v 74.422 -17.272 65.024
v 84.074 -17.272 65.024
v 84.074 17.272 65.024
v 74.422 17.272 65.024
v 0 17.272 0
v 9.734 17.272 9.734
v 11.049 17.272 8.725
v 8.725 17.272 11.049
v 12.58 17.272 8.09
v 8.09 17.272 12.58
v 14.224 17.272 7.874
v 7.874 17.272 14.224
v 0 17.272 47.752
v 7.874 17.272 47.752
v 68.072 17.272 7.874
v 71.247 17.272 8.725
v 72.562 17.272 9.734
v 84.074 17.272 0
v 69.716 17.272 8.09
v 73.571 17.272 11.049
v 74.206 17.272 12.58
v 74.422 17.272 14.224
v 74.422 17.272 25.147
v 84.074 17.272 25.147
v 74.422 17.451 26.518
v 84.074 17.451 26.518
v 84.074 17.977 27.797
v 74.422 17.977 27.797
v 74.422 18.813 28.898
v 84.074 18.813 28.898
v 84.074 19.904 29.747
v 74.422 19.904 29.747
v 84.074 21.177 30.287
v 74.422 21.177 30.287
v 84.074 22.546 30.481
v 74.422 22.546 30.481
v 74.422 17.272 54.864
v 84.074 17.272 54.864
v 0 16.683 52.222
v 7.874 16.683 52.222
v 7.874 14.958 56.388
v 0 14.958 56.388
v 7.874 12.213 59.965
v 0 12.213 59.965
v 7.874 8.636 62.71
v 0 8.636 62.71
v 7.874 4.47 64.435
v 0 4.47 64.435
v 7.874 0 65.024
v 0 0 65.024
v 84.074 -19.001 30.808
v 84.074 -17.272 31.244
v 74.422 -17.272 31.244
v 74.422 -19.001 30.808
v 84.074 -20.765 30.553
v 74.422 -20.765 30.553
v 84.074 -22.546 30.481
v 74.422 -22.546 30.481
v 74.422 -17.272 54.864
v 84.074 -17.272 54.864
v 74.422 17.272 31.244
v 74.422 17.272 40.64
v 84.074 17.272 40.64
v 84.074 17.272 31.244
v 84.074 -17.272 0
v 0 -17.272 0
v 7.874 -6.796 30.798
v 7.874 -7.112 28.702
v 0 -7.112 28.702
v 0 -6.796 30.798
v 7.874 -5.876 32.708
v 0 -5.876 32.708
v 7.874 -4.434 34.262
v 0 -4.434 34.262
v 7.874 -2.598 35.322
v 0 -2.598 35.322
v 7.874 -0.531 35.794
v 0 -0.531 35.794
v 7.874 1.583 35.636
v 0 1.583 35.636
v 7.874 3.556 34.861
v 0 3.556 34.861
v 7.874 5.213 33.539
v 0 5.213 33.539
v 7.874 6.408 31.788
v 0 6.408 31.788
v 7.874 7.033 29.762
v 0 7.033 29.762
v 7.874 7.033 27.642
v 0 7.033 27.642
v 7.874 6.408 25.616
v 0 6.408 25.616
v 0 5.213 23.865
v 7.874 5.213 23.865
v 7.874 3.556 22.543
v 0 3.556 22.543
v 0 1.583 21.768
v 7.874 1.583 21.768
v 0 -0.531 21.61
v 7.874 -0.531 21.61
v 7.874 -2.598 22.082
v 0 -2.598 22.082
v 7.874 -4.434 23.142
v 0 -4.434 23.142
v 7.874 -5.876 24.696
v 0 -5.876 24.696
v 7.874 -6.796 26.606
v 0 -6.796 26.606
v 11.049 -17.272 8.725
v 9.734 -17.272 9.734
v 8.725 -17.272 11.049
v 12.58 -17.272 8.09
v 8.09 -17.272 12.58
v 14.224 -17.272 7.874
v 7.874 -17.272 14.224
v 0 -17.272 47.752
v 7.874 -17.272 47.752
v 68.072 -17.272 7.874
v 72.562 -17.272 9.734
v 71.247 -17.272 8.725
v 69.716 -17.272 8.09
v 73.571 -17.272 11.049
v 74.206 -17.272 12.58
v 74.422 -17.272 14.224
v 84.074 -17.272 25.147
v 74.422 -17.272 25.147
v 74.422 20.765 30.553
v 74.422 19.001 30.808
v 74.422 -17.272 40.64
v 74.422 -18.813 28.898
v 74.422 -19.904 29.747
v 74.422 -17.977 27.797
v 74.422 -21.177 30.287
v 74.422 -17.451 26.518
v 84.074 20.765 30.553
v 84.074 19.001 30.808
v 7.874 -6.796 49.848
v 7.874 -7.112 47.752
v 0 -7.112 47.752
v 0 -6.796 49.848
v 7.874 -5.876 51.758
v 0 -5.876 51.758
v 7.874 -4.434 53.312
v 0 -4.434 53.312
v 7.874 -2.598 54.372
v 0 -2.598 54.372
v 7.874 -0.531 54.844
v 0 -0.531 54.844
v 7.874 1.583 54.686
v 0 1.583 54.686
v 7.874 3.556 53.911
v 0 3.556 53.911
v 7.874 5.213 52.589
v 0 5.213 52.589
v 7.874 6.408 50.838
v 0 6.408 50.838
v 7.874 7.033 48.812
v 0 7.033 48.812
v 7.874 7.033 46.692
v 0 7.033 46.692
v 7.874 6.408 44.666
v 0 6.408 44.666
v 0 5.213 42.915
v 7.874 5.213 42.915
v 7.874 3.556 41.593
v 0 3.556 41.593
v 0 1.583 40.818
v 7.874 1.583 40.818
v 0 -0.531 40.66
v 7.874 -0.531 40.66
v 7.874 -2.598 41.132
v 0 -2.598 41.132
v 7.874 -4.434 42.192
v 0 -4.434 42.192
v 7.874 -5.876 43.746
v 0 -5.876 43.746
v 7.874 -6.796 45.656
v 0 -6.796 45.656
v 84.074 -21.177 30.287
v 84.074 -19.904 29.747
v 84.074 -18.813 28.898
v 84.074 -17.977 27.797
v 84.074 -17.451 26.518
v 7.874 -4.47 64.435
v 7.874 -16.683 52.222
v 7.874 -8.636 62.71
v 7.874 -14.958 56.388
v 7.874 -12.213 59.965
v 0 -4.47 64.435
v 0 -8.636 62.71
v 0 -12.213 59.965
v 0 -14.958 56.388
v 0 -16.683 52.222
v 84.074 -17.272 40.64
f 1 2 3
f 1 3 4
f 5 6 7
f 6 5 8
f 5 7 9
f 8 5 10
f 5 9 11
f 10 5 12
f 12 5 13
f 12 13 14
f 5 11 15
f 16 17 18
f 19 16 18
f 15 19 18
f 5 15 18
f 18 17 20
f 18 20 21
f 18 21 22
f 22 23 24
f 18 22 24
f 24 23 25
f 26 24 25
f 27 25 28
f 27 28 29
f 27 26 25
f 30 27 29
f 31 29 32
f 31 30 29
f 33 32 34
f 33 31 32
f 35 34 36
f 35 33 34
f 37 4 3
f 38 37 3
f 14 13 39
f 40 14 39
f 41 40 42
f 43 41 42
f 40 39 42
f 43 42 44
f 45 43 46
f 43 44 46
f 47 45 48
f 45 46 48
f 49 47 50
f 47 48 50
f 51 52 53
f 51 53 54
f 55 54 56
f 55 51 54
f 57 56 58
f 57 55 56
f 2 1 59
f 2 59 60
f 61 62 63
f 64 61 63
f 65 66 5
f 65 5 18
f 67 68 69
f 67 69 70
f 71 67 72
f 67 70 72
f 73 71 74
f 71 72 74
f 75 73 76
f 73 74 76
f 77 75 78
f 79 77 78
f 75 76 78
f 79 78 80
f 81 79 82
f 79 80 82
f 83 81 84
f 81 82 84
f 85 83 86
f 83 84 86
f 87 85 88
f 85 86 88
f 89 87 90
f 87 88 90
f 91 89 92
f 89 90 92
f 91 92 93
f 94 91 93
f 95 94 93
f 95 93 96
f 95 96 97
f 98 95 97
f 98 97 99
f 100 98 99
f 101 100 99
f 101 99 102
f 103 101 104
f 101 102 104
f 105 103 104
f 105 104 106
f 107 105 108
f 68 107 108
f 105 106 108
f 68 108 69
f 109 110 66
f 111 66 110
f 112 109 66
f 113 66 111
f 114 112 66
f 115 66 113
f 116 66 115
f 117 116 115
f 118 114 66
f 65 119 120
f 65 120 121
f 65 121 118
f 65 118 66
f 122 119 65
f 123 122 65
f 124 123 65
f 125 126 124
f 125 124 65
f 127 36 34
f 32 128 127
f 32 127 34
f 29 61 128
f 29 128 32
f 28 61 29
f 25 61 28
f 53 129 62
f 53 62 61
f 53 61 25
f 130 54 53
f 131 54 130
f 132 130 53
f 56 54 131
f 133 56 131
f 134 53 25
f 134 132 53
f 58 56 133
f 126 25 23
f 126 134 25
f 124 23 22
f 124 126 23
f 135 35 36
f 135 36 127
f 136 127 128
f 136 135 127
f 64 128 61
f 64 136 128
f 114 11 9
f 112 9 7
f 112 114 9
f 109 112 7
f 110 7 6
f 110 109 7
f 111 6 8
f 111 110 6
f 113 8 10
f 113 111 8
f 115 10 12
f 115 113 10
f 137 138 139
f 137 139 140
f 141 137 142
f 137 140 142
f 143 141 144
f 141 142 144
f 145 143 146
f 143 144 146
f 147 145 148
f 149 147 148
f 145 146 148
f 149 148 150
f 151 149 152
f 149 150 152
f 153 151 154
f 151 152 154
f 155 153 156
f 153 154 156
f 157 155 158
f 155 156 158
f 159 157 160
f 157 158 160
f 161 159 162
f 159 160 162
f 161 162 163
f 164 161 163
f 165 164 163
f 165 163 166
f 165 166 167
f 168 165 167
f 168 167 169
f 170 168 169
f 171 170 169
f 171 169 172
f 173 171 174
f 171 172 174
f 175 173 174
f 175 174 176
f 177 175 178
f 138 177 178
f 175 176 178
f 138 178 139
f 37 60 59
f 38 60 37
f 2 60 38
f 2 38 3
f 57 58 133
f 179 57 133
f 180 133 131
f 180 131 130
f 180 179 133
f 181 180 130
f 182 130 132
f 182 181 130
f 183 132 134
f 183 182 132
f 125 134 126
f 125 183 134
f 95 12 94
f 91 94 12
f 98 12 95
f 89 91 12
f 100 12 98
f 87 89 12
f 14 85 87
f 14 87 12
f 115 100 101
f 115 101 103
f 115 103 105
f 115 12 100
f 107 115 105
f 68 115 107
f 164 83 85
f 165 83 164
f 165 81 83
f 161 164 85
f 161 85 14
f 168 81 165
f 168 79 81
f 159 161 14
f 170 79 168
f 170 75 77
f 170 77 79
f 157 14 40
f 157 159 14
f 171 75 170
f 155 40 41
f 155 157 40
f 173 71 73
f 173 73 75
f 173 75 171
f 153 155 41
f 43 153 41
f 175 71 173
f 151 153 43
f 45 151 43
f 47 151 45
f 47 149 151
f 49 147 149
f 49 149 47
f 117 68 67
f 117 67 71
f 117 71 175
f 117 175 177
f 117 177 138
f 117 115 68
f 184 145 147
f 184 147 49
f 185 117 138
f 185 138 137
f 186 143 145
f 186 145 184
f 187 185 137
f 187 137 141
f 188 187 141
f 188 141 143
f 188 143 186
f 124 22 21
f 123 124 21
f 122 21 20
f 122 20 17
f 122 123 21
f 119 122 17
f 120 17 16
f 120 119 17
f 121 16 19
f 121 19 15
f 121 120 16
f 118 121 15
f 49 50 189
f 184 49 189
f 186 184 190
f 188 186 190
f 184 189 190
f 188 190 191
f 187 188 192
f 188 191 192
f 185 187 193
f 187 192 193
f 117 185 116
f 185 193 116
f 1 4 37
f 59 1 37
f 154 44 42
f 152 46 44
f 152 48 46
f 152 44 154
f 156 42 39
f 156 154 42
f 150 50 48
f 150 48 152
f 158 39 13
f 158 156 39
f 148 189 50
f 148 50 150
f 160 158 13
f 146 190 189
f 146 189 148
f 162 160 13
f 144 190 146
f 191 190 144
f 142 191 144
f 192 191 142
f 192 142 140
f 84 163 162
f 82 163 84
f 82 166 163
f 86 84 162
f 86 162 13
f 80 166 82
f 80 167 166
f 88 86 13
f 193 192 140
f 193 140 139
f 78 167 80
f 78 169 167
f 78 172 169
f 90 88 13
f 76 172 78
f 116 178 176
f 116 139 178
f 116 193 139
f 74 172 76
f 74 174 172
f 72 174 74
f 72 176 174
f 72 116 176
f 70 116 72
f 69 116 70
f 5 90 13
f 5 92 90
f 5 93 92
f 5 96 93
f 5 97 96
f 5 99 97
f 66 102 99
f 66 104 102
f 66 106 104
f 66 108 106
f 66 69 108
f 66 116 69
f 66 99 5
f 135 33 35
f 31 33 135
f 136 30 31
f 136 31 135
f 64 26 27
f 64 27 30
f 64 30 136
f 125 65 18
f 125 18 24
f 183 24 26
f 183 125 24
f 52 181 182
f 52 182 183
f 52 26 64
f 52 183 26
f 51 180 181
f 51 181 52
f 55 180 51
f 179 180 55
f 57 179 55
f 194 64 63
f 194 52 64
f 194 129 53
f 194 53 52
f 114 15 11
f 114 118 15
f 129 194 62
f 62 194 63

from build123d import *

# Parameters (mm, degrees)
F1_DEPTH = 17.272
F2_R     = 7.112
F3_DEPTH = 7.874
F5_DEPTH = 9.652
F4_W     = 34.544
F4_H     = 14.224
F6_DEPTH = 9.652


# Not quite as in the source:
# - a feature names something its author has since deleted; it is built from what else it names


with BuildPart() as f1:
    # F0 (on Front) → F1 (new body, symmetric)
    with BuildSketch(Plane.XZ):
        with BuildLine():
            ThreePointArc((14.224, 7.874), (9.7338719395, 9.7338719395), (7.874, 14.224))
            Line((7.874, 14.224), (7.874, 7.874))
            Line((7.874, 7.874), (14.224, 7.874))
        make_face()
        with BuildLine():
            Line((74.422, 7.874), (74.422, 14.224))
            ThreePointArc((74.422, 14.224), (72.5621280605, 9.7338719395), (68.072, 7.874))
            Line((68.072, 7.874), (74.422, 7.874))
        make_face()
        Polygon((0, 65.024), (0, 0), (84.074, 0), (84.074, 65.024), (74.422, 65.024), (74.422, 14.224), (74.422, 7.874), (68.072, 7.874), (14.224, 7.874), (7.874, 7.874), (7.874, 14.224), (7.874, 65.024), align=None)
    extrude(amount=F1_DEPTH, both=True)

    # F2 (on face) → F3 (cut, through all)
    with BuildSketch(Plane(origin=(0, 0, 0), x_dir=(0, -1, 0), z_dir=(-1, 0, 0))):
        with BuildLine():
            ThreePointArc((-17.272, 47.752), (-12.2131483247, 59.9651483247), (0, 65.024))
            Line((0, 65.024), (-17.272, 65.024))
            Line((-17.272, 65.024), (-17.272, 47.752))
        make_face()
        with BuildLine():
            ThreePointArc((0, 65.024), (12.2131483247, 59.9651483247), (17.272, 47.752))
            Line((17.272, 47.752), (17.272, 65.024))
            Line((17.272, 65.024), (0, 65.024))
        make_face()
        with Locations((0, 47.752)):
            Circle(F2_R)
        with Locations((0, 28.702)):
            Circle(F2_R)
    extrude(amount=-F3_DEPTH, mode=Mode.SUBTRACT)

    # F4 (on face) → F5 (join, through all)
    with BuildSketch(Plane.YZ.offset(84.074)):
        with BuildLine():
            Line((-17.272, 25.5601424724), (-17.272, 31.2439539618))
            ThreePointArc((-17.272, 31.2439539618), (-19.8794356336, 30.6578954767), (-22.5460674157, 30.4810903008))
            ThreePointArc((-22.5460674157, 30.4810903008), (-18.8131622494, 28.8978853564), (-17.272, 25.1474270113))
            Line((-17.272, 25.1474270113), (-17.272, 25.5601424724))
        make_face()
        with BuildLine():
            ThreePointArc((22.5460674157, 30.4810903008), (19.8794356336, 30.6578954767), (17.272, 31.2439539618))
            Line((17.272, 31.2439539618), (17.272, 30.48))
            Line((17.272, 30.48), (17.272, 25.1474270113))
            ThreePointArc((17.272, 25.1474270113), (18.8131622494, 28.8978853564), (22.5460674157, 30.4810903008))
        make_face()
    extrude(amount=-F5_DEPTH)

    # F4 (on face) → F6 (cut, through all)
    with BuildSketch(Plane.YZ.offset(84.074)):
        with Locations((0, 47.752)):
            Rectangle(F4_W, F4_H)
    extrude(amount=-F6_DEPTH, mode=Mode.SUBTRACT)


solid = f1.part
